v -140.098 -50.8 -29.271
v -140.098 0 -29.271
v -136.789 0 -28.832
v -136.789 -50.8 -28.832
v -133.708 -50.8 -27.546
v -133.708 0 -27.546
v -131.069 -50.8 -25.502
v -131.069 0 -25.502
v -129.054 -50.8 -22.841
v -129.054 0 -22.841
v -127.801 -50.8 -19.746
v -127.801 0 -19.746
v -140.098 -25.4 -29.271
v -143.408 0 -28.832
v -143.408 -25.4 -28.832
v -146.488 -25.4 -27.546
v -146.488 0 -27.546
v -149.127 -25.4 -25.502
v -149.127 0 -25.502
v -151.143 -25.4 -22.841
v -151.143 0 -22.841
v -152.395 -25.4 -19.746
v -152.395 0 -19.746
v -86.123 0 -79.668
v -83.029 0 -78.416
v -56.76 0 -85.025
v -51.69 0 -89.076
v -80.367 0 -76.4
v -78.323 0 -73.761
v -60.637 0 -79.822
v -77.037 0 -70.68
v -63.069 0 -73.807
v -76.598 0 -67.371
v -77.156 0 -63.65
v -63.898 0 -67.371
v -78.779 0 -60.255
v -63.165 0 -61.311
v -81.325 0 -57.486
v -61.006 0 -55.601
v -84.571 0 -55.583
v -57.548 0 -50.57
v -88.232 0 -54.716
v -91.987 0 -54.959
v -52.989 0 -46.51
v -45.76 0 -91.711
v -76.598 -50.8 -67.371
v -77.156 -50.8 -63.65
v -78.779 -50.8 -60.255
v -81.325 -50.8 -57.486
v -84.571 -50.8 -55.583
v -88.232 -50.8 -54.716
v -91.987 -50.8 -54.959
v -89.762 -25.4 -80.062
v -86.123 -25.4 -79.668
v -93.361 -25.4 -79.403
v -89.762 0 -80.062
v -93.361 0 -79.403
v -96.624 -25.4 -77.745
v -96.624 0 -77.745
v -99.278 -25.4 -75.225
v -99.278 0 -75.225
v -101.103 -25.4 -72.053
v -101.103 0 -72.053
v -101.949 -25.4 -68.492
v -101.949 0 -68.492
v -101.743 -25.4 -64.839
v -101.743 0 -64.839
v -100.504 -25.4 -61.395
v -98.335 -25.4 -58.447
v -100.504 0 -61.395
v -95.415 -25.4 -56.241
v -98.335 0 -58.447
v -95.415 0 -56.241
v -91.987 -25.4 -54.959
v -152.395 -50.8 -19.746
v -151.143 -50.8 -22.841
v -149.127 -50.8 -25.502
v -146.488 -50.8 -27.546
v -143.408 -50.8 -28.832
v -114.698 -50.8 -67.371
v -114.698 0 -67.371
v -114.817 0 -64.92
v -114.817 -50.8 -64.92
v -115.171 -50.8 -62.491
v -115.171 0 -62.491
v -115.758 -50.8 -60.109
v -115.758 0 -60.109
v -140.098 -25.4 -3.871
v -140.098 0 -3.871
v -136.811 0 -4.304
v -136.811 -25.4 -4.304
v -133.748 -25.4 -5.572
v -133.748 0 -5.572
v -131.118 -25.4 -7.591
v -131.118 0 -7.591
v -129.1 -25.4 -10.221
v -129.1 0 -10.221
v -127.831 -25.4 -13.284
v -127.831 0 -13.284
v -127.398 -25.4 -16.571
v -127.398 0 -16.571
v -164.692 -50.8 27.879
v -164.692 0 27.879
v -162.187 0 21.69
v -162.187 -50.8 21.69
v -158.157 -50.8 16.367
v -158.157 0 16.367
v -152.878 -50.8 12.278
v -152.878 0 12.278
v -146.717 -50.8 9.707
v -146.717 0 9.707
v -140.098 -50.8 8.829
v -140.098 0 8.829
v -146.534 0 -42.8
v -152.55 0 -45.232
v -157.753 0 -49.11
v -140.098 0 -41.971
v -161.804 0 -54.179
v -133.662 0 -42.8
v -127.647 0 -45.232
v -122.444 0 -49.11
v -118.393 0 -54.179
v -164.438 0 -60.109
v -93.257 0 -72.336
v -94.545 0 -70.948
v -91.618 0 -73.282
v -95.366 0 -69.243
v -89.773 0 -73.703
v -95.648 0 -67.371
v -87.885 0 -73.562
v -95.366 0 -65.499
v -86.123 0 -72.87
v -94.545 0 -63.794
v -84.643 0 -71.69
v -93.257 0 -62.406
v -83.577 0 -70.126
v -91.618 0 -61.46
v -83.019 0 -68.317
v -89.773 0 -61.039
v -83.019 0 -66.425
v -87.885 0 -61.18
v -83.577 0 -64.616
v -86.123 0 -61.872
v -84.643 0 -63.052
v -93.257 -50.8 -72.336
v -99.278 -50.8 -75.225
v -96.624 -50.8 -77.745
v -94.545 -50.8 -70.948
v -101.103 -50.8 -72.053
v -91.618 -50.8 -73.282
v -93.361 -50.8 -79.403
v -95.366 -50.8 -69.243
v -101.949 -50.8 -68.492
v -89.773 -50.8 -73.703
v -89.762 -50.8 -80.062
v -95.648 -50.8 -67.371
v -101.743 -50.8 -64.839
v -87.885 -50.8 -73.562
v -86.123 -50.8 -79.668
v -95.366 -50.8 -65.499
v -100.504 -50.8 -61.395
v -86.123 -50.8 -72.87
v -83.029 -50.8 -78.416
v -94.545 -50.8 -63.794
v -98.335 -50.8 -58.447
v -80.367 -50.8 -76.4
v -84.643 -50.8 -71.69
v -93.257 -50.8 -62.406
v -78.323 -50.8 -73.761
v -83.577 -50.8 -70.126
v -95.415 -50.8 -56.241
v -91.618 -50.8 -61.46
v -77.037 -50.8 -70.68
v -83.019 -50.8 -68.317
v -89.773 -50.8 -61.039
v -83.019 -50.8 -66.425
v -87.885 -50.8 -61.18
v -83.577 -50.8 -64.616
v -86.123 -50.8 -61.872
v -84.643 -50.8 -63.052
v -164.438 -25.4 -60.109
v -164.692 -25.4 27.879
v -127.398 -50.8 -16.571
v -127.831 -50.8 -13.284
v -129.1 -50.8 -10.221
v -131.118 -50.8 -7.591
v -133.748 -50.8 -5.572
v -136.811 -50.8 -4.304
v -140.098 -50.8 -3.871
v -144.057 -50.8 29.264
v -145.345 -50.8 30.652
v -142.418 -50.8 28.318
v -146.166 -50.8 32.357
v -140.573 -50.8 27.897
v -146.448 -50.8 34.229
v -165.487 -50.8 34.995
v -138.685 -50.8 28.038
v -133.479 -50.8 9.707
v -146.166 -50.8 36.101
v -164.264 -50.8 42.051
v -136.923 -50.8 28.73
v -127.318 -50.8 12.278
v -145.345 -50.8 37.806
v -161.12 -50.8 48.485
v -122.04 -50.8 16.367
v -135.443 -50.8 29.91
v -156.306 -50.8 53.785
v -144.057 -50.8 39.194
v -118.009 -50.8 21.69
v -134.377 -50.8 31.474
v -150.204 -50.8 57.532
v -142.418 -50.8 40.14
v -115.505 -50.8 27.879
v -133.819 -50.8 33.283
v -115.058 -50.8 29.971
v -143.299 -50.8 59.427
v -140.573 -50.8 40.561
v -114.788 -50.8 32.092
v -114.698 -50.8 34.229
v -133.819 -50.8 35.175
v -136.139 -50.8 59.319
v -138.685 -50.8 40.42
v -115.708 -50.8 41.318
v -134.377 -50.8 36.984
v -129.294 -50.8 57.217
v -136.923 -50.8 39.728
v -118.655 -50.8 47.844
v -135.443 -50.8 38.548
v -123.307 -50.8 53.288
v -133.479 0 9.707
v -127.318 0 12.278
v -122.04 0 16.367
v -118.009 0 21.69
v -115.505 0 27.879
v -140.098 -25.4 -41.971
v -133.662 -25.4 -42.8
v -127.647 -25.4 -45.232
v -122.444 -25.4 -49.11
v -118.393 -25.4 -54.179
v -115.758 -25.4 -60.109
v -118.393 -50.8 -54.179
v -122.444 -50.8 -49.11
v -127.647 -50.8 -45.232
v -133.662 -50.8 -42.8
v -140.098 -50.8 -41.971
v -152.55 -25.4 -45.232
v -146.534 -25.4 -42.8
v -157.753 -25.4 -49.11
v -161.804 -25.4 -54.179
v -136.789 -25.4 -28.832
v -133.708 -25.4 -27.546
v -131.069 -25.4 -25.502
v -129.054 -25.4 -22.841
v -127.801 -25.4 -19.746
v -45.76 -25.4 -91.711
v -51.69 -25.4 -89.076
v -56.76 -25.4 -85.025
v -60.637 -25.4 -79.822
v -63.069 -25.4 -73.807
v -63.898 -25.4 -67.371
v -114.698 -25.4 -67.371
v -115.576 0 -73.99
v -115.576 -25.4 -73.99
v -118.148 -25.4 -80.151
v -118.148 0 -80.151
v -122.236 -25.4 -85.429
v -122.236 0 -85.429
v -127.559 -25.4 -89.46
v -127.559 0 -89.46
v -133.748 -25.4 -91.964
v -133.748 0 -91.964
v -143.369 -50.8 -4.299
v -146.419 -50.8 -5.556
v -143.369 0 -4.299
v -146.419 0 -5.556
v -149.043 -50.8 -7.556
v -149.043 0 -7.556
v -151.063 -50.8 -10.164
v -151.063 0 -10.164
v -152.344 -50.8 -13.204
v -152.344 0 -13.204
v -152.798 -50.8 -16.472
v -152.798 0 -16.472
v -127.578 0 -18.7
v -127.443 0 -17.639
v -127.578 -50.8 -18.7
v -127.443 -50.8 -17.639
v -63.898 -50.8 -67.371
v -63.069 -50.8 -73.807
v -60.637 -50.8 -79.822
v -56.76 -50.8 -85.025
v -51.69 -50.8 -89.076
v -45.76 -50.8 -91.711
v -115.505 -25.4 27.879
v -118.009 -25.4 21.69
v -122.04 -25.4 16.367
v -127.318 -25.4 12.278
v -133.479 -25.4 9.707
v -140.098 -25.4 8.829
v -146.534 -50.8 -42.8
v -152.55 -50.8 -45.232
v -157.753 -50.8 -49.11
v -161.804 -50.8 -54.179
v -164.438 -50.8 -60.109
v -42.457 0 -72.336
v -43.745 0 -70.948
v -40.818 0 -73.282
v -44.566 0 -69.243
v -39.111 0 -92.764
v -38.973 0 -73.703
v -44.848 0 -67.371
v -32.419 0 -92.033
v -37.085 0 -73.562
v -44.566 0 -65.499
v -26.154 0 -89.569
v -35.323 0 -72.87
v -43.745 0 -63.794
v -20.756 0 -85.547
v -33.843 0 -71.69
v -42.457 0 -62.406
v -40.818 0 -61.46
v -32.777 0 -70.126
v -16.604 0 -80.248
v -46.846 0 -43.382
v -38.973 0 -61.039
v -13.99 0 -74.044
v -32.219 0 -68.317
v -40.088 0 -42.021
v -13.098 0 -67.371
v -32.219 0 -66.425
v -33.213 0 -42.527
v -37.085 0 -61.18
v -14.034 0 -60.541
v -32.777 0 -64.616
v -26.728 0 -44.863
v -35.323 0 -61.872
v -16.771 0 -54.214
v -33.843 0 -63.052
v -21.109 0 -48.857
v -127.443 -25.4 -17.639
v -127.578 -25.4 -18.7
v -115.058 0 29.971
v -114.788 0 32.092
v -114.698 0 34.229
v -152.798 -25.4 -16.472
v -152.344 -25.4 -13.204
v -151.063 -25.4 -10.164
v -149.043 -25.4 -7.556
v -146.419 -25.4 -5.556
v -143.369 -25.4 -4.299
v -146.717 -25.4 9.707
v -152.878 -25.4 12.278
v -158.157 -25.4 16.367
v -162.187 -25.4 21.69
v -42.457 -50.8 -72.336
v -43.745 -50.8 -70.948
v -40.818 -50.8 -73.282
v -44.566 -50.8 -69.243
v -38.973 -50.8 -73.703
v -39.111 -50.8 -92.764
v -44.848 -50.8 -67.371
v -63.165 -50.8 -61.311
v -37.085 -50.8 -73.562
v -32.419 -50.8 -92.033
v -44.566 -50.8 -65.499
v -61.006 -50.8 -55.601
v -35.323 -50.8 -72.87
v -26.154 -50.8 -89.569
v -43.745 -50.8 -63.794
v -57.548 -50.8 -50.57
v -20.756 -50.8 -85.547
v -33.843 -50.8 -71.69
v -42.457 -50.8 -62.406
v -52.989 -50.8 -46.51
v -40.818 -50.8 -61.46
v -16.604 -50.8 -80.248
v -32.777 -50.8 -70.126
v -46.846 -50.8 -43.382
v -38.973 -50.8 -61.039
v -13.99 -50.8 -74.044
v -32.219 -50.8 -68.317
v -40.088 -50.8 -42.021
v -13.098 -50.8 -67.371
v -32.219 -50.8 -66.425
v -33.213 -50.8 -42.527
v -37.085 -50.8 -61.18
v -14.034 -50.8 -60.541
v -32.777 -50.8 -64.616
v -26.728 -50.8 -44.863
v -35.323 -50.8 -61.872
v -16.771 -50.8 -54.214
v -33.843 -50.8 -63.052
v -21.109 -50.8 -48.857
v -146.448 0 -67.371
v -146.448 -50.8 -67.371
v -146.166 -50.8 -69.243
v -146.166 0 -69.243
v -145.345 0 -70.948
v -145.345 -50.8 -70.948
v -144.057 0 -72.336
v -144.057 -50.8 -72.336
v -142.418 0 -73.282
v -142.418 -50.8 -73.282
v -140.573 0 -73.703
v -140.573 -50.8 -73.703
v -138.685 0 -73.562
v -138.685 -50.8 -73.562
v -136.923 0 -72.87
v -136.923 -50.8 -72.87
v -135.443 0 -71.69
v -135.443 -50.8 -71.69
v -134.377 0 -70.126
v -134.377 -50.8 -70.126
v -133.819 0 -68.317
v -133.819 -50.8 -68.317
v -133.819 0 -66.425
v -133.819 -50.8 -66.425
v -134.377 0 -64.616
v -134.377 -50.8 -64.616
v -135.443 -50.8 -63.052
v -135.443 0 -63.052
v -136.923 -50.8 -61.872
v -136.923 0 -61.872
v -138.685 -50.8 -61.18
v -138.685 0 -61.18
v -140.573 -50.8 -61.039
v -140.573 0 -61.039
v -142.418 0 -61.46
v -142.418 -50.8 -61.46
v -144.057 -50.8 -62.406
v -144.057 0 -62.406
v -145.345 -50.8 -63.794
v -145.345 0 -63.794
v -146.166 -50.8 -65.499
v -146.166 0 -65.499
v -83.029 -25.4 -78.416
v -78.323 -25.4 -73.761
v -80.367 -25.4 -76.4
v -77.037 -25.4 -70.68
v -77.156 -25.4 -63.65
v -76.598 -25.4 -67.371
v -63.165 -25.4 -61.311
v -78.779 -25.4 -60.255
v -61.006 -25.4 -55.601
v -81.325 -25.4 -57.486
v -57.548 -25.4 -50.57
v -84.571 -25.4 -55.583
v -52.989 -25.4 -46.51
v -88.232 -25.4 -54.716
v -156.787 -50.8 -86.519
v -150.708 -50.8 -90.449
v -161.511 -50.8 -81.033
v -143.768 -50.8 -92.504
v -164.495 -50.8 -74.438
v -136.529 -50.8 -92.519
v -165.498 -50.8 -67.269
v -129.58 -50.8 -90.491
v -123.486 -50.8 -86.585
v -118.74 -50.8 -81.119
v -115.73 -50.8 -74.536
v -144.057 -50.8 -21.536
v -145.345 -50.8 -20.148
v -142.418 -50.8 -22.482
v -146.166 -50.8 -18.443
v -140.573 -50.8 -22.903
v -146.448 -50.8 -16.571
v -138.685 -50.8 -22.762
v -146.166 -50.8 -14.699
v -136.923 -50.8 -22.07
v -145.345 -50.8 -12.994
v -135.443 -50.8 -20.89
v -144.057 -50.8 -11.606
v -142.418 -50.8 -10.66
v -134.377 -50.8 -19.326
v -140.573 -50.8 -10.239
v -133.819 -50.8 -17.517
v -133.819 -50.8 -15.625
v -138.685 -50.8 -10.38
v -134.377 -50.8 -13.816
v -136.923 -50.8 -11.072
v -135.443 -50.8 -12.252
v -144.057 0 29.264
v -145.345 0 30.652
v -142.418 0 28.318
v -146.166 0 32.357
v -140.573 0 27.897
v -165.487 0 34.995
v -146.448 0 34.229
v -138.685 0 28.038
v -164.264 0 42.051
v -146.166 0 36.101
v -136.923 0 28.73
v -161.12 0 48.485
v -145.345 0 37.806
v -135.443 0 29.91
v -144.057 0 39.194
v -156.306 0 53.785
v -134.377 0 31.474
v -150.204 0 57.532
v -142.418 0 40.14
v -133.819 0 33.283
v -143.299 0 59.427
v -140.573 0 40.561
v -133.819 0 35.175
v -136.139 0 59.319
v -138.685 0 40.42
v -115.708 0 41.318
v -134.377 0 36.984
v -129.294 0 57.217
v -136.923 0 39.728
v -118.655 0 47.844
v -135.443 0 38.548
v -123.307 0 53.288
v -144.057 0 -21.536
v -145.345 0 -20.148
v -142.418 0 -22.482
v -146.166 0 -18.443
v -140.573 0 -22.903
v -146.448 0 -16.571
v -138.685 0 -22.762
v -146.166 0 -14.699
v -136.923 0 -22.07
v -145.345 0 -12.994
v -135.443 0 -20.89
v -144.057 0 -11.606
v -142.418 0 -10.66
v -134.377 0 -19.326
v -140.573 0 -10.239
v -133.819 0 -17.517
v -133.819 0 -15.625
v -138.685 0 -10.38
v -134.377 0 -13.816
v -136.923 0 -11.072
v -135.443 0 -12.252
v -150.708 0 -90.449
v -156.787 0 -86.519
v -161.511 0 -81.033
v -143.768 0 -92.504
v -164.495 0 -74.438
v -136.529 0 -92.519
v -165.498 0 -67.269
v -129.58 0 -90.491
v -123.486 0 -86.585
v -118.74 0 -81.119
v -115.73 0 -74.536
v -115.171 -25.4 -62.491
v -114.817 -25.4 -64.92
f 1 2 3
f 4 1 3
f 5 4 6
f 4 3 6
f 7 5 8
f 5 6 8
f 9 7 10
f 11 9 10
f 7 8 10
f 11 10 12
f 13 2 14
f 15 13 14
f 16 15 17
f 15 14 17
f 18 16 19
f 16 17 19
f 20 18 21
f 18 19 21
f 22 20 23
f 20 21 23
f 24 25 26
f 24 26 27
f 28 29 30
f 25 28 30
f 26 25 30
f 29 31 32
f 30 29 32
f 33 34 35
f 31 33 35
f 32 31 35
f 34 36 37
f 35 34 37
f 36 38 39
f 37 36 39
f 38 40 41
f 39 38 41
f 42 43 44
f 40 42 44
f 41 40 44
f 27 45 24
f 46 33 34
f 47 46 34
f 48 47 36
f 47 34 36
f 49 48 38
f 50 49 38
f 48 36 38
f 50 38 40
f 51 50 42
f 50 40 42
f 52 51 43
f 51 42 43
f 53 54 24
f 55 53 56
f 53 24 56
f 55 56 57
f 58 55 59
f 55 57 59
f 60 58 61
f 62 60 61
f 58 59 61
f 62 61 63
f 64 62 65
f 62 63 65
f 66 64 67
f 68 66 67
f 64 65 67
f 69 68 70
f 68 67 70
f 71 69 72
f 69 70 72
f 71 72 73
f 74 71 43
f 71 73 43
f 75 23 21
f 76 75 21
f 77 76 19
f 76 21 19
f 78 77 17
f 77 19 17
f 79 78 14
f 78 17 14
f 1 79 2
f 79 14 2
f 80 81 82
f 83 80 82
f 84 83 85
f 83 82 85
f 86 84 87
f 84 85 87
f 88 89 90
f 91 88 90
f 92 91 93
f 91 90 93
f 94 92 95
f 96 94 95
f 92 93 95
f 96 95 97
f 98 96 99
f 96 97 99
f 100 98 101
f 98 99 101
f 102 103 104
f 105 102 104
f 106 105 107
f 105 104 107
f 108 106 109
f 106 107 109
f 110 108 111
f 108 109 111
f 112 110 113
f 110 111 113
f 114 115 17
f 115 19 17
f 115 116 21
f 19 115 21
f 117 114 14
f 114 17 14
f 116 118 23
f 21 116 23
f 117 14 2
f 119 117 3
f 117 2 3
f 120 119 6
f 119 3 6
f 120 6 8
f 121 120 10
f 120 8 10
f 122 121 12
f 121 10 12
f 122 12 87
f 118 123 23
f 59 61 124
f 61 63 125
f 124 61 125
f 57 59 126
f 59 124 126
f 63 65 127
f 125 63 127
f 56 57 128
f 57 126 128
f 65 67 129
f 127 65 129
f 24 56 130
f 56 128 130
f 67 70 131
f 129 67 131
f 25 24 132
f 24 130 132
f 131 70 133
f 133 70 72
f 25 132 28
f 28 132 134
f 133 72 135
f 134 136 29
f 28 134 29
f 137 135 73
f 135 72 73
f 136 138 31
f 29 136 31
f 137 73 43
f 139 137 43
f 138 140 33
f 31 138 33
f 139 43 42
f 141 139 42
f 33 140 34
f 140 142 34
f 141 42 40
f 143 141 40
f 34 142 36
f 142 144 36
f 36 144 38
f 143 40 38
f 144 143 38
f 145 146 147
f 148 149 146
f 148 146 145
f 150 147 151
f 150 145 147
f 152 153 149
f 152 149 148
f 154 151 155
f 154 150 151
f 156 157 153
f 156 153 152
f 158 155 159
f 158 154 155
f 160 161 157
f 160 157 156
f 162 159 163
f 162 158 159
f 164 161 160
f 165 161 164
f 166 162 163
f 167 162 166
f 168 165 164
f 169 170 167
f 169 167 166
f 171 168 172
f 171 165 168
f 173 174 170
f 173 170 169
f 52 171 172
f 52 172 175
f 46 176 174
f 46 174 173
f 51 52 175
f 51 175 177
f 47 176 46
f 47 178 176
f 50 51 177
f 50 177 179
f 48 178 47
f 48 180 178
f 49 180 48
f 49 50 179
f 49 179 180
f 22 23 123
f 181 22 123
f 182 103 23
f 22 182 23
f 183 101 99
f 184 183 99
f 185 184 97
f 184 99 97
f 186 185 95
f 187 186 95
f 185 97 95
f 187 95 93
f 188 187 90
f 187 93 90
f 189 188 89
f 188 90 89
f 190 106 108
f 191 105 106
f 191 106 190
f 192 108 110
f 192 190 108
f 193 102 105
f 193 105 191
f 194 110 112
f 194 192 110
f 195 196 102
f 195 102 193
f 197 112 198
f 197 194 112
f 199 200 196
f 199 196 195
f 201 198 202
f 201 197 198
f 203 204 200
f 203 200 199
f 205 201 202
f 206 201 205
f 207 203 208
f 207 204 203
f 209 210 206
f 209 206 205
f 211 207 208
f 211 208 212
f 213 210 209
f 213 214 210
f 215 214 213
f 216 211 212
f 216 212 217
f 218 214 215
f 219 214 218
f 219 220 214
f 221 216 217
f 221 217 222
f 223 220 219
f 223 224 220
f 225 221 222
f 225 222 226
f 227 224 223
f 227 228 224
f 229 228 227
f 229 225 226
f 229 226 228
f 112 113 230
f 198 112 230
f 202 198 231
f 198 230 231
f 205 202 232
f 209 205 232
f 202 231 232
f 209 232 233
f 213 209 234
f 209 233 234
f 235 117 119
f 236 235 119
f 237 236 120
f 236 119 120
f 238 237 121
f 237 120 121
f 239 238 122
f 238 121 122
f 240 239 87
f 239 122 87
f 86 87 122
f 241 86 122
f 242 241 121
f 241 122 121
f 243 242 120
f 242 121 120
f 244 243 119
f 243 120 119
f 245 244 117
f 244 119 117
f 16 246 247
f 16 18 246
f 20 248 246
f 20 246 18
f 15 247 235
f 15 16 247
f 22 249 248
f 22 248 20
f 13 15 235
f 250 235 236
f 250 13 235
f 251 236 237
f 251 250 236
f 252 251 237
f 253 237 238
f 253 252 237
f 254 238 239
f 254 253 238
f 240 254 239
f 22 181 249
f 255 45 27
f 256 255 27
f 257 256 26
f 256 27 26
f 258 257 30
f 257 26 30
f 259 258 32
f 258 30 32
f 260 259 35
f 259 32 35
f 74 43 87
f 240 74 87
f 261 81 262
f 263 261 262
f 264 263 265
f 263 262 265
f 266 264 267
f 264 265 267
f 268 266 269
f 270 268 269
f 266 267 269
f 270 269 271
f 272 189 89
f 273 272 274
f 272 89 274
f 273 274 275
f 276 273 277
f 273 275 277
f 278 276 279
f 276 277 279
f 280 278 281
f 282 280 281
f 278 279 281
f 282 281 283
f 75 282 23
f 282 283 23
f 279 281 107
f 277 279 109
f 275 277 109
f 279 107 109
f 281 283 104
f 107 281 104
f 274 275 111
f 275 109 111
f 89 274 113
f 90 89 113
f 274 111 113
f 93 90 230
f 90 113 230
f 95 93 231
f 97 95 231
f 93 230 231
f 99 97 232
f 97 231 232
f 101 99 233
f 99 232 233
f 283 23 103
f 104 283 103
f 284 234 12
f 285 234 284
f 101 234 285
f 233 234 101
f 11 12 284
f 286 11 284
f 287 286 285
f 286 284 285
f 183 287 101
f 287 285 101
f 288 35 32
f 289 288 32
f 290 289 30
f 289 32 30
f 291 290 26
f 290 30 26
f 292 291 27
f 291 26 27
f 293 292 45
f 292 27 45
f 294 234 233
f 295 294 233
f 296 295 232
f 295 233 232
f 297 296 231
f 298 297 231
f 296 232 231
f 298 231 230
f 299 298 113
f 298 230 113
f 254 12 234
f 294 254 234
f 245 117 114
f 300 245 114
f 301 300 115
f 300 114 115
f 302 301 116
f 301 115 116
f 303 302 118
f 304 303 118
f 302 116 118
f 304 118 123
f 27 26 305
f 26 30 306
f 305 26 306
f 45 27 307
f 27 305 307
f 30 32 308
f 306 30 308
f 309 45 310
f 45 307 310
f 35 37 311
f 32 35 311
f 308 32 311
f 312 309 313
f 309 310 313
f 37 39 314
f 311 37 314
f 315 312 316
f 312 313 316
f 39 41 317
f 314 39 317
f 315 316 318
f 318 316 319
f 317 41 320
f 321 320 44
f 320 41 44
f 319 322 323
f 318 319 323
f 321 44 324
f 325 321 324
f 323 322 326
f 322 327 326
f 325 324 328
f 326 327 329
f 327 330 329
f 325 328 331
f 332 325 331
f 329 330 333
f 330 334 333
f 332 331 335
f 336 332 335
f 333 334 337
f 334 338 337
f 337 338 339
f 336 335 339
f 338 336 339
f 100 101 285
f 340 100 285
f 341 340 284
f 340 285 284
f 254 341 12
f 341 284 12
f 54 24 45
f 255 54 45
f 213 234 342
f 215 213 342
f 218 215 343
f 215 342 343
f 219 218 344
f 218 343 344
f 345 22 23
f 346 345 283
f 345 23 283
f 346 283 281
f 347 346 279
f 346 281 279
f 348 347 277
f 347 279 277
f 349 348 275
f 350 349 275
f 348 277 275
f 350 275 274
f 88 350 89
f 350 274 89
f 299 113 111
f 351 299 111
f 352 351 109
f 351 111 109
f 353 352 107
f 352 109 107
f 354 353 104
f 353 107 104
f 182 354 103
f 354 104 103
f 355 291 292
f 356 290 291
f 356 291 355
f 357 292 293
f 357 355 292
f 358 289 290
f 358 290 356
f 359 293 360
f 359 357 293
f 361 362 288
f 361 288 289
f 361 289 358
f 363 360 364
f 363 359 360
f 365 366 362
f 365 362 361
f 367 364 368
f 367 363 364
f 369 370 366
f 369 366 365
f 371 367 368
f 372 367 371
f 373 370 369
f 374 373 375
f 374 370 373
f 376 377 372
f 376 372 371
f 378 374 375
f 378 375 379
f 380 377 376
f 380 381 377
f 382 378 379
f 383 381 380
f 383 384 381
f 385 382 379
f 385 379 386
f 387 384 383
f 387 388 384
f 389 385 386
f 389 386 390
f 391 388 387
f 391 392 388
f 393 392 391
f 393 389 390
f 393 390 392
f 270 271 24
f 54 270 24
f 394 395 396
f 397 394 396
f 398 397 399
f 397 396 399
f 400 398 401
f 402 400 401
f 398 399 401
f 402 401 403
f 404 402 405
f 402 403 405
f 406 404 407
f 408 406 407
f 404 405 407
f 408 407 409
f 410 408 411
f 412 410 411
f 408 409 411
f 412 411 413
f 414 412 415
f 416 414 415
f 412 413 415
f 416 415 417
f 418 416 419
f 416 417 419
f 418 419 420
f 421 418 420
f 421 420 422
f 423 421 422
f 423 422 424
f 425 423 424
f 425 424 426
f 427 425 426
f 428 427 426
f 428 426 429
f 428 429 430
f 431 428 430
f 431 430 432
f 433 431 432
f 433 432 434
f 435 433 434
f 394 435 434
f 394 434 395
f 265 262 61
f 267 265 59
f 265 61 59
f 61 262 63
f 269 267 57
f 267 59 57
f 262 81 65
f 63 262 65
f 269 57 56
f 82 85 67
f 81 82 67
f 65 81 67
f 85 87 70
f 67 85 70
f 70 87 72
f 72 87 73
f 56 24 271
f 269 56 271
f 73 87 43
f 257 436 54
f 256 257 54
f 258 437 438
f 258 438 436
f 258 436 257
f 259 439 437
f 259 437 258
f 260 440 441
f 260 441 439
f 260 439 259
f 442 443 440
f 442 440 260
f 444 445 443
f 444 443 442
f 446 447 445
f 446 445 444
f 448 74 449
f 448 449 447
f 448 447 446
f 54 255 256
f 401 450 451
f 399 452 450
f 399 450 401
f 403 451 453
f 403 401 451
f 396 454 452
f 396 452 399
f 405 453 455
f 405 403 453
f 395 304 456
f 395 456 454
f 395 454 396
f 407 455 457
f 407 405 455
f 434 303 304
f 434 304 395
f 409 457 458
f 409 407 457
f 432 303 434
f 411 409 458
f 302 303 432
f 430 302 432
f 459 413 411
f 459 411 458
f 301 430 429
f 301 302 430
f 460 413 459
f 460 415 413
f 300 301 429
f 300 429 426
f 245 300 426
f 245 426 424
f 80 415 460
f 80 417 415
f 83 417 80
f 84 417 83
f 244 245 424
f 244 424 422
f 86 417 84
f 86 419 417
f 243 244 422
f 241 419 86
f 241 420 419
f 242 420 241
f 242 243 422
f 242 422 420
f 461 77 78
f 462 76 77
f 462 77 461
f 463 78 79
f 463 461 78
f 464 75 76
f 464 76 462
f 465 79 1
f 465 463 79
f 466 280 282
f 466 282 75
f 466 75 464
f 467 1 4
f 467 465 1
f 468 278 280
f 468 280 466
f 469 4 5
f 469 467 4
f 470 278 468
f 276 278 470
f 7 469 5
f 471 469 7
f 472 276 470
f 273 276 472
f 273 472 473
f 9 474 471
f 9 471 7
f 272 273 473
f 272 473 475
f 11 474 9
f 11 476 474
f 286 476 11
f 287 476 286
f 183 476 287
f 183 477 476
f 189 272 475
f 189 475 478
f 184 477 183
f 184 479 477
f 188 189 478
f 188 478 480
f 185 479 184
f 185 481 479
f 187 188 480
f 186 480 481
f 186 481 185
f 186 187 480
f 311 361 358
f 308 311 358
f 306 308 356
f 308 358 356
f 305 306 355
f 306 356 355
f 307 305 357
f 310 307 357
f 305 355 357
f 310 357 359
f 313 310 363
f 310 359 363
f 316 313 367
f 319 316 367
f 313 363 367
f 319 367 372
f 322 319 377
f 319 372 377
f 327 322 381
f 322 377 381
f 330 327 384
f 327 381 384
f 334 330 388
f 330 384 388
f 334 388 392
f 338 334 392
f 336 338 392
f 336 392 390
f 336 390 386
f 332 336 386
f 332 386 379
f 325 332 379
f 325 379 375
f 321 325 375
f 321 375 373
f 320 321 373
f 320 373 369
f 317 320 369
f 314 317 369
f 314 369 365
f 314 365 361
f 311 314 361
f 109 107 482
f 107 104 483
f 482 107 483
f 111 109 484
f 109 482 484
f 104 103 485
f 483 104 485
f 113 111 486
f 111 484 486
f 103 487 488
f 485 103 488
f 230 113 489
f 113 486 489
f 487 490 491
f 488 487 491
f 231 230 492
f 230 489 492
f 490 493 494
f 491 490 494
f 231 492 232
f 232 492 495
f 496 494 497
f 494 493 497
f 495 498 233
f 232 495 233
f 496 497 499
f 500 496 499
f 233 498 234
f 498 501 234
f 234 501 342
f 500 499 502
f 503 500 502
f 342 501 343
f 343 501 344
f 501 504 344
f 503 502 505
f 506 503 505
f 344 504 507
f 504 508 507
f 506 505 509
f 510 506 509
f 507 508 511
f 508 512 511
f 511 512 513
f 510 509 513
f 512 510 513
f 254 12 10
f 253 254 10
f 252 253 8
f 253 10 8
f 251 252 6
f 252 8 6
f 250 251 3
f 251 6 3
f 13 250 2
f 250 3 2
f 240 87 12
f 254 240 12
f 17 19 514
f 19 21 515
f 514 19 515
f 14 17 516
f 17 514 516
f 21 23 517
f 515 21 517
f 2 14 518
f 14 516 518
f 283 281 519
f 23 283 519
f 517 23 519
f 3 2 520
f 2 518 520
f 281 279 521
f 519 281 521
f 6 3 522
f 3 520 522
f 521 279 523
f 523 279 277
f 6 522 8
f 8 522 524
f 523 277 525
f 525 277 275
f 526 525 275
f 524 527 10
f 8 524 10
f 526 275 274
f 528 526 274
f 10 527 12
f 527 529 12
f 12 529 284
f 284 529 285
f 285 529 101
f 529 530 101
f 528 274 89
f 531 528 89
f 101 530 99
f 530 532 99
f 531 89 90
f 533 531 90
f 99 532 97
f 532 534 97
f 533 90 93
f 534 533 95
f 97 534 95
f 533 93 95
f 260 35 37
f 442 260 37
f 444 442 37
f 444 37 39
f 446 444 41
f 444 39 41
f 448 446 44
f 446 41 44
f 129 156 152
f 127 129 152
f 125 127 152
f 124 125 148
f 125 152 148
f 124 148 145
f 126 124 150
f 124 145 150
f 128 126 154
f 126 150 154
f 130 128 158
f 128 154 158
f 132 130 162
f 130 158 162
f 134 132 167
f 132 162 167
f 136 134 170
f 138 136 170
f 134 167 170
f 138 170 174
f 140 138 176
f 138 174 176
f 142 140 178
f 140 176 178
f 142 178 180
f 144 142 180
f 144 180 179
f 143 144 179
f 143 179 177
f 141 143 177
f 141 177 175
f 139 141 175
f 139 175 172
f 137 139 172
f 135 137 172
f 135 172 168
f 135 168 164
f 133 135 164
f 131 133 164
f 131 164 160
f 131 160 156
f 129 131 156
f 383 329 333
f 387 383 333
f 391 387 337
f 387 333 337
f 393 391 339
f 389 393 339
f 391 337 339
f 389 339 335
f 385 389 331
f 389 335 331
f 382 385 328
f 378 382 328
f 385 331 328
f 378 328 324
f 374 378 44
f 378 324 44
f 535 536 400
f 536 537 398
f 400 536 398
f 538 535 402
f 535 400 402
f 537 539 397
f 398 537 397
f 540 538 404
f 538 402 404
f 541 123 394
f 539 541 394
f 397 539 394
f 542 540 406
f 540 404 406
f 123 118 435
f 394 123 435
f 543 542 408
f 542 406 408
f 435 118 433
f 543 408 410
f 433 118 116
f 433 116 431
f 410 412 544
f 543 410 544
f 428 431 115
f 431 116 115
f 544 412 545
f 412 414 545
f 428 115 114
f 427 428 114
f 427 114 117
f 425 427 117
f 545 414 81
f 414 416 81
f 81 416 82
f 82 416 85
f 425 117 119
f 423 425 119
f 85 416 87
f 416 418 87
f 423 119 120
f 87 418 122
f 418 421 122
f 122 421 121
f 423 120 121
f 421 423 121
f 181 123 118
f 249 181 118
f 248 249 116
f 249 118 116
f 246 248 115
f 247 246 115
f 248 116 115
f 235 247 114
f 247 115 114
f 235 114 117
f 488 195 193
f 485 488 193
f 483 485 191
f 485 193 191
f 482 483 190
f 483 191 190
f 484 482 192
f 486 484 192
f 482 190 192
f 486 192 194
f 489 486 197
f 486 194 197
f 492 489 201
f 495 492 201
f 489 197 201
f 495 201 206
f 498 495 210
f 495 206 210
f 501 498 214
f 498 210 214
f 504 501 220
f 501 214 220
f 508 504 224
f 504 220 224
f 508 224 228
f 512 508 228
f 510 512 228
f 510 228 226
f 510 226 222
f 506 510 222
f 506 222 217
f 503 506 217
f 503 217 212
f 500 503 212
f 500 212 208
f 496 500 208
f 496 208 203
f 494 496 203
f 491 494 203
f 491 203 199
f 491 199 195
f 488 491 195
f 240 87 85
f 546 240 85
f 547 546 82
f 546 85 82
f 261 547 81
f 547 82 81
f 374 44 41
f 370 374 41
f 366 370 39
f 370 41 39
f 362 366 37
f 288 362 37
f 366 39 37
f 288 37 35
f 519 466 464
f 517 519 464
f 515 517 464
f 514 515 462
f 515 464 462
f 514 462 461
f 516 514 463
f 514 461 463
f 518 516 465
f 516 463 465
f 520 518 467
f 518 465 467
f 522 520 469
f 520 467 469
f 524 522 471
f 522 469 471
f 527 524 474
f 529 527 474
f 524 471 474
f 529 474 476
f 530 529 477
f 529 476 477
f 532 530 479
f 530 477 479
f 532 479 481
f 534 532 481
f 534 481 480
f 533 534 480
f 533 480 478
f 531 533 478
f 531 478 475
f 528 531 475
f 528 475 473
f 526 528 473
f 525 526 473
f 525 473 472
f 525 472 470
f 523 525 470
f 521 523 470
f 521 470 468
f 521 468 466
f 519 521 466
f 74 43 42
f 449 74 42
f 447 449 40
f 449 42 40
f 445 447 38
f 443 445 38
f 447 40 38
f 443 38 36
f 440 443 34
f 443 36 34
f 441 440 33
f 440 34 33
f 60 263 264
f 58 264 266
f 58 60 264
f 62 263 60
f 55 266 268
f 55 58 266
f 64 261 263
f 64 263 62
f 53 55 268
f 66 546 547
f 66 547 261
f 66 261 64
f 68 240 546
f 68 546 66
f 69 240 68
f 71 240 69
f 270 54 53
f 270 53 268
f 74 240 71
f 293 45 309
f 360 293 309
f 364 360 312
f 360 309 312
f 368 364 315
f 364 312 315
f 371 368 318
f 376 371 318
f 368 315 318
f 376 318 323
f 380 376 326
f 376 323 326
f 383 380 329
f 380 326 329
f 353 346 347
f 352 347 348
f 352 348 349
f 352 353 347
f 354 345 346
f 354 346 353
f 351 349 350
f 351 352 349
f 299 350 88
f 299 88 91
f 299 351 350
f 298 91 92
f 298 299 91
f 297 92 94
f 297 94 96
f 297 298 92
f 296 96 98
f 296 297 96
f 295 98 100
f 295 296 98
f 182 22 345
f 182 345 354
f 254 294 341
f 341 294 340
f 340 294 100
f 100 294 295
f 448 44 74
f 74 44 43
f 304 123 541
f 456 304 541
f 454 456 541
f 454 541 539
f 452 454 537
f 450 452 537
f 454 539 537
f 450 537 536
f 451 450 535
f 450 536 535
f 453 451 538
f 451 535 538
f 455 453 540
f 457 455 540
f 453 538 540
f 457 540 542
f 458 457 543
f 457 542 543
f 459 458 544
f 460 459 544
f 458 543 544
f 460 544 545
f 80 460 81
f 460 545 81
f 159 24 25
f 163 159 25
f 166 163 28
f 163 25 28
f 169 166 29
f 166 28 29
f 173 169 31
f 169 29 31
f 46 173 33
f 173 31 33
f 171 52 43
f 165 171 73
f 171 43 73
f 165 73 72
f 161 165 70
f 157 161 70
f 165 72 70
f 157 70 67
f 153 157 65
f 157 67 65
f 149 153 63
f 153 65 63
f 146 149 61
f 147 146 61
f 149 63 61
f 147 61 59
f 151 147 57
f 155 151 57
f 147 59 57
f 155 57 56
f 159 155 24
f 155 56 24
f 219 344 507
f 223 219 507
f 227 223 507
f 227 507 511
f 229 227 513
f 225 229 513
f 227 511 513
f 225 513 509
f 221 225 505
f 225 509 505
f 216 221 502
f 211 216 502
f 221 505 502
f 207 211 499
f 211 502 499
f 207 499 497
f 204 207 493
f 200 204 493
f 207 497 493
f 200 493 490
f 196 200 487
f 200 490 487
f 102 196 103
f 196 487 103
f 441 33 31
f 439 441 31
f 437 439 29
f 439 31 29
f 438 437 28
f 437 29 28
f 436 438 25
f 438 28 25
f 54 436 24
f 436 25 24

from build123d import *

# Parameters (mm, degrees)
F1_DEPTH = 50.8
F2_DEPTH = 25.4
F3_D     = 12.7
F3_2_D   = 12.7
F3_3_D   = 12.7
F3_4_D   = 12.7
F3_5_D   = 12.7


with BuildPart() as f1:
    # F0 (on Front) → F1 (new body)
    with BuildSketch(Plane.XZ):
        with BuildLine():
            ThreePointArc((-140.0981609707, 8.8290543904), (-124.543901104, 14.1485912484), (-115.5047167223, 27.8790543904))
            ThreePointArc((-115.5047167223, 27.8790543904), (-114.9006066855, 31.0285453614), (-114.6981609707, 34.2290543904))
            ThreePointArc((-114.6981609707, 34.2290543904), (-143.2986699997, 59.4266086756), (-164.6916052191, 27.8790543904))
            ThreePointArc((-164.6916052191, 27.8790543904), (-155.6524208374, 14.1485912484), (-140.0981609707, 8.8290543904))
        make_face()
    extrude(amount=F1_DEPTH)

    # F3 (through all)
    with Locations(Plane(origin=(0, 0, 0), x_dir=(1, 0, 0), z_dir=(0, 1, 0))):
        with Locations((-140.0981609707, -34.2290543904), (-140.0981609707, 16.5709456096), (-140.0981609707, 67.3709456096), (-89.2981609707, 67.3709456096), (-38.4981609707, 67.3709456096)):
            Hole(F3_D / 2)


with BuildPart() as f1b:
    # F0 (on Front) → F1, piece 2 (new body)
    with BuildSketch(Plane.XZ):
        with BuildLine():
            Line((-140.0981609707, -16.5709456096), (-140.0981609707, -29.2709456096))
            ThreePointArc((-140.0981609707, -29.2709456096), (-132.3210310373, -26.6111771806), (-127.8014388465, -19.7459456096))
            ThreePointArc((-127.8014388465, -19.7459456096), (-127.4993838281, -18.1712001241), (-127.3981609707, -16.5709456096))
            ThreePointArc((-127.3981609707, -16.5709456096), (-131.1179048496, -7.5906894885), (-140.0981609707, -3.8709456096))
            Line((-140.0981609707, -3.8709456096), (-140.0981609707, -16.5709456096))
        make_face()
        with BuildLine():
            ThreePointArc((-152.3948830949, -19.7459456096), (-147.875290904, -26.6111771806), (-140.0981609707, -29.2709456096))
            Line((-140.0981609707, -29.2709456096), (-140.0981609707, -16.5709456096))
            Line((-140.0981609707, -16.5709456096), (-140.0981609707, -3.8709456096))
            ThreePointArc((-140.0981609707, -3.8709456096), (-150.1383925417, -8.7938156762), (-152.3948830949, -19.7459456096))
        make_face()
    extrude(amount=F1_DEPTH)

    # F3#2 (through all)
    with Locations(Plane(origin=(0, 0, 0), x_dir=(1, 0, 0), z_dir=(0, 1, 0))):
        with Locations((-140.0981609707, -34.2290543904), (-140.0981609707, 16.5709456096), (-140.0981609707, 67.3709456096), (-89.2981609707, 67.3709456096), (-38.4981609707, 67.3709456096)):
            Hole(F3_2_D / 2)


with BuildPart() as f1c:
    # F0 (on Front) → F1, piece 3 (new body)
    with BuildSketch(Plane.XZ):
        with BuildLine():
            Line((-114.6981609707, -67.3709456096), (-140.0981609707, -67.3709456096))
            Line((-140.0981609707, -67.3709456096), (-140.0981609707, -41.9709456096))
            ThreePointArc((-140.0981609707, -41.9709456096), (-155.2754549353, -47.0040669112), (-164.4378542892, -60.1087607345))
            ThreePointArc((-164.4378542892, -60.1087607345), (-158.3903052719, -84.9935860719), (-133.7481609707, -91.964389858))
            ThreePointArc((-133.7481609707, -91.964389858), (-120.0176978286, -82.9252054762), (-114.6981609707, -67.3709456096))
        make_face()
        with BuildLine():
            Line((-140.0981609707, -41.9709456096), (-140.0981609707, -67.3709456096))
            Line((-140.0981609707, -67.3709456096), (-114.6981609707, -67.3709456096))
            ThreePointArc((-114.6981609707, -67.3709456096), (-114.9646354491, -63.7013550528), (-115.7584676521, -60.1087607345))
            ThreePointArc((-115.7584676521, -60.1087607345), (-124.9208670061, -47.0040669112), (-140.0981609707, -41.9709456096))
        make_face()
    extrude(amount=F1_DEPTH)

    # F3#3 (through all)
    with Locations(Plane(origin=(0, 0, 0), x_dir=(1, 0, 0), z_dir=(0, 1, 0))):
        with Locations((-140.0981609707, -34.2290543904), (-140.0981609707, 16.5709456096), (-140.0981609707, 67.3709456096), (-89.2981609707, 67.3709456096), (-38.4981609707, 67.3709456096)):
            Hole(F3_3_D / 2)


with BuildPart() as f1d:
    # F0 (on Front) → F1, piece 4 (new body)
    with BuildSketch(Plane.XZ):
        with BuildLine():
            ThreePointArc((-91.9871427928, -54.9588798363), (-99.1835054043, -59.3978680714), (-101.9981609707, -67.3709456096))
            Line((-101.9981609707, -67.3709456096), (-89.2981609707, -67.3709456096))
            Line((-89.2981609707, -67.3709456096), (-76.5981609707, -67.3709456096))
            ThreePointArc((-76.5981609707, -67.3709456096), (-81.3250834325, -57.485601176), (-91.9871427928, -54.9588798363))
        make_face()
        with BuildLine():
            Line((-89.2981609707, -67.3709456096), (-101.9981609707, -67.3709456096))
            ThreePointArc((-101.9981609707, -67.3709456096), (-97.075290904, -77.4111771806), (-86.1231609707, -79.6676677338))
            ThreePointArc((-86.1231609707, -79.6676677338), (-79.2579293997, -75.1480755429), (-76.5981609707, -67.3709456096))
            Line((-76.5981609707, -67.3709456096), (-89.2981609707, -67.3709456096))
        make_face()
    extrude(amount=F1_DEPTH)

    # F3#4 (through all)
    with Locations(Plane(origin=(0, 0, 0), x_dir=(1, 0, 0), z_dir=(0, 1, 0))):
        with Locations((-140.0981609707, -34.2290543904), (-140.0981609707, 16.5709456096), (-140.0981609707, 67.3709456096), (-89.2981609707, 67.3709456096), (-38.4981609707, 67.3709456096)):
            Hole(F3_4_D / 2)


with BuildPart() as f1e:
    # F0 (on Front) → F1, piece 5 (new body)
    with BuildSketch(Plane.XZ):
        with BuildLine():
            ThreePointArc((-13.0981609707, -67.3709456096), (-26.7277465819, -44.8627838651), (-52.9892905073, -46.5102849117))
            ThreePointArc((-52.9892905073, -46.5102849117), (-61.0063227152, -55.6005312207), (-63.8981609707, -67.3709456096))
            ThreePointArc((-63.8981609707, -67.3709456096), (-58.865039669, -82.5482395741), (-45.7603458457, -91.7106389281))
            ThreePointArc((-45.7603458457, -91.7106389281), (-23.3208670061, -87.7378243079), (-13.0981609707, -67.3709456096))
        make_face()
    extrude(amount=F1_DEPTH)

    # F3#5 (through all)
    with Locations(Plane(origin=(0, 0, 0), x_dir=(1, 0, 0), z_dir=(0, 1, 0))):
        with Locations((-140.0981609707, -34.2290543904), (-140.0981609707, 16.5709456096), (-140.0981609707, 67.3709456096), (-89.2981609707, 67.3709456096), (-38.4981609707, 67.3709456096)):
            Hole(F3_5_D / 2)


with BuildPart() as f2:
    # F0 (on Front) → F2 (new body)
    with BuildSketch(Plane.XZ):
        with BuildLine():
            Line((-164.6916052191, 27.8790543904), (-152.3948830949, -19.7459456096))
            ThreePointArc((-152.3948830949, -19.7459456096), (-150.1383925417, -8.7938156762), (-140.0981609707, -3.8709456096))
            Line((-140.0981609707, -3.8709456096), (-140.0981609707, 8.8290543904))
            ThreePointArc((-140.0981609707, 8.8290543904), (-155.6524208374, 14.1485912484), (-164.6916052191, 27.8790543904))
        make_face()
        with BuildLine():
            ThreePointArc((-127.3981609707, -16.5709456096), (-127.4993838281, -18.1712001241), (-127.8014388465, -19.7459456096))
            Line((-127.8014388465, -19.7459456096), (-115.5047167223, 27.8790543904))
            ThreePointArc((-115.5047167223, 27.8790543904), (-124.543901104, 14.1485912484), (-140.0981609707, 8.8290543904))
            Line((-140.0981609707, 8.8290543904), (-140.0981609707, -3.8709456096))
            ThreePointArc((-140.0981609707, -3.8709456096), (-131.1179048496, -7.5906894885), (-127.3981609707, -16.5709456096))
        make_face()
    extrude(amount=F2_DEPTH)


with BuildPart() as f2b:
    # F0 (on Front) → F2, piece 2 (new body)
    with BuildSketch(Plane.XZ):
        with BuildLine():
            Line((-140.0981609707, -29.2709456096), (-140.0981609707, -41.9709456096))
            ThreePointArc((-140.0981609707, -41.9709456096), (-124.9208670061, -47.0040669112), (-115.7584676521, -60.1087607345))
            Line((-115.7584676521, -60.1087607345), (-127.8014388465, -19.7459456096))
            ThreePointArc((-127.8014388465, -19.7459456096), (-132.3210310373, -26.6111771806), (-140.0981609707, -29.2709456096))
        make_face()
        with BuildLine():
            ThreePointArc((-164.4378542892, -60.1087607345), (-155.2754549353, -47.0040669112), (-140.0981609707, -41.9709456096))
            Line((-140.0981609707, -41.9709456096), (-140.0981609707, -29.2709456096))
            ThreePointArc((-140.0981609707, -29.2709456096), (-147.875290904, -26.6111771806), (-152.3948830949, -19.7459456096))
            Line((-152.3948830949, -19.7459456096), (-164.4378542892, -60.1087607345))
        make_face()
    extrude(amount=F2_DEPTH)


with BuildPart() as f2c:
    # F0 (on Front) → F2, piece 3 (new body)
    with BuildSketch(Plane.XZ):
        with BuildLine():
            Line((-52.9892905073, -46.5102849117), (-91.9871427928, -54.9588798363))
            ThreePointArc((-91.9871427928, -54.9588798363), (-81.3250834325, -57.485601176), (-76.5981609707, -67.3709456096))
            Line((-76.5981609707, -67.3709456096), (-63.8981609707, -67.3709456096))
            ThreePointArc((-63.8981609707, -67.3709456096), (-61.0063227152, -55.6005312207), (-52.9892905073, -46.5102849117))
        make_face()
        with BuildLine():
            ThreePointArc((-76.5981609707, -67.3709456096), (-79.2579293997, -75.1480755429), (-86.1231609707, -79.6676677338))
            Line((-86.1231609707, -79.6676677338), (-45.7603458457, -91.7106389281))
            ThreePointArc((-45.7603458457, -91.7106389281), (-58.865039669, -82.5482395741), (-63.8981609707, -67.3709456096))
            Line((-63.8981609707, -67.3709456096), (-76.5981609707, -67.3709456096))
        make_face()
    extrude(amount=F2_DEPTH)


with BuildPart() as f2d:
    # F0 (on Front) → F2, piece 4 (new body)
    with BuildSketch(Plane.XZ):
        with BuildLine():
            Line((-101.9981609707, -67.3709456096), (-114.6981609707, -67.3709456096))
            ThreePointArc((-114.6981609707, -67.3709456096), (-120.0176978286, -82.9252054762), (-133.7481609707, -91.964389858))
            Line((-133.7481609707, -91.964389858), (-86.1231609707, -79.6676677338))
            ThreePointArc((-86.1231609707, -79.6676677338), (-97.075290904, -77.4111771806), (-101.9981609707, -67.3709456096))
        make_face()
        with BuildLine():
            ThreePointArc((-115.7584676521, -60.1087607345), (-114.9646354491, -63.7013550528), (-114.6981609707, -67.3709456096))
            Line((-114.6981609707, -67.3709456096), (-101.9981609707, -67.3709456096))
            ThreePointArc((-101.9981609707, -67.3709456096), (-99.1835054043, -59.3978680714), (-91.9871427928, -54.9588798363))
            Line((-91.9871427928, -54.9588798363), (-115.7584676521, -60.1087607345))
        make_face()
    extrude(amount=F2_DEPTH)


solid = Compound([f1.part, f1b.part, f1c.part, f1d.part, f1e.part, f2.part, f2b.part, f2c.part, f2d.part])
